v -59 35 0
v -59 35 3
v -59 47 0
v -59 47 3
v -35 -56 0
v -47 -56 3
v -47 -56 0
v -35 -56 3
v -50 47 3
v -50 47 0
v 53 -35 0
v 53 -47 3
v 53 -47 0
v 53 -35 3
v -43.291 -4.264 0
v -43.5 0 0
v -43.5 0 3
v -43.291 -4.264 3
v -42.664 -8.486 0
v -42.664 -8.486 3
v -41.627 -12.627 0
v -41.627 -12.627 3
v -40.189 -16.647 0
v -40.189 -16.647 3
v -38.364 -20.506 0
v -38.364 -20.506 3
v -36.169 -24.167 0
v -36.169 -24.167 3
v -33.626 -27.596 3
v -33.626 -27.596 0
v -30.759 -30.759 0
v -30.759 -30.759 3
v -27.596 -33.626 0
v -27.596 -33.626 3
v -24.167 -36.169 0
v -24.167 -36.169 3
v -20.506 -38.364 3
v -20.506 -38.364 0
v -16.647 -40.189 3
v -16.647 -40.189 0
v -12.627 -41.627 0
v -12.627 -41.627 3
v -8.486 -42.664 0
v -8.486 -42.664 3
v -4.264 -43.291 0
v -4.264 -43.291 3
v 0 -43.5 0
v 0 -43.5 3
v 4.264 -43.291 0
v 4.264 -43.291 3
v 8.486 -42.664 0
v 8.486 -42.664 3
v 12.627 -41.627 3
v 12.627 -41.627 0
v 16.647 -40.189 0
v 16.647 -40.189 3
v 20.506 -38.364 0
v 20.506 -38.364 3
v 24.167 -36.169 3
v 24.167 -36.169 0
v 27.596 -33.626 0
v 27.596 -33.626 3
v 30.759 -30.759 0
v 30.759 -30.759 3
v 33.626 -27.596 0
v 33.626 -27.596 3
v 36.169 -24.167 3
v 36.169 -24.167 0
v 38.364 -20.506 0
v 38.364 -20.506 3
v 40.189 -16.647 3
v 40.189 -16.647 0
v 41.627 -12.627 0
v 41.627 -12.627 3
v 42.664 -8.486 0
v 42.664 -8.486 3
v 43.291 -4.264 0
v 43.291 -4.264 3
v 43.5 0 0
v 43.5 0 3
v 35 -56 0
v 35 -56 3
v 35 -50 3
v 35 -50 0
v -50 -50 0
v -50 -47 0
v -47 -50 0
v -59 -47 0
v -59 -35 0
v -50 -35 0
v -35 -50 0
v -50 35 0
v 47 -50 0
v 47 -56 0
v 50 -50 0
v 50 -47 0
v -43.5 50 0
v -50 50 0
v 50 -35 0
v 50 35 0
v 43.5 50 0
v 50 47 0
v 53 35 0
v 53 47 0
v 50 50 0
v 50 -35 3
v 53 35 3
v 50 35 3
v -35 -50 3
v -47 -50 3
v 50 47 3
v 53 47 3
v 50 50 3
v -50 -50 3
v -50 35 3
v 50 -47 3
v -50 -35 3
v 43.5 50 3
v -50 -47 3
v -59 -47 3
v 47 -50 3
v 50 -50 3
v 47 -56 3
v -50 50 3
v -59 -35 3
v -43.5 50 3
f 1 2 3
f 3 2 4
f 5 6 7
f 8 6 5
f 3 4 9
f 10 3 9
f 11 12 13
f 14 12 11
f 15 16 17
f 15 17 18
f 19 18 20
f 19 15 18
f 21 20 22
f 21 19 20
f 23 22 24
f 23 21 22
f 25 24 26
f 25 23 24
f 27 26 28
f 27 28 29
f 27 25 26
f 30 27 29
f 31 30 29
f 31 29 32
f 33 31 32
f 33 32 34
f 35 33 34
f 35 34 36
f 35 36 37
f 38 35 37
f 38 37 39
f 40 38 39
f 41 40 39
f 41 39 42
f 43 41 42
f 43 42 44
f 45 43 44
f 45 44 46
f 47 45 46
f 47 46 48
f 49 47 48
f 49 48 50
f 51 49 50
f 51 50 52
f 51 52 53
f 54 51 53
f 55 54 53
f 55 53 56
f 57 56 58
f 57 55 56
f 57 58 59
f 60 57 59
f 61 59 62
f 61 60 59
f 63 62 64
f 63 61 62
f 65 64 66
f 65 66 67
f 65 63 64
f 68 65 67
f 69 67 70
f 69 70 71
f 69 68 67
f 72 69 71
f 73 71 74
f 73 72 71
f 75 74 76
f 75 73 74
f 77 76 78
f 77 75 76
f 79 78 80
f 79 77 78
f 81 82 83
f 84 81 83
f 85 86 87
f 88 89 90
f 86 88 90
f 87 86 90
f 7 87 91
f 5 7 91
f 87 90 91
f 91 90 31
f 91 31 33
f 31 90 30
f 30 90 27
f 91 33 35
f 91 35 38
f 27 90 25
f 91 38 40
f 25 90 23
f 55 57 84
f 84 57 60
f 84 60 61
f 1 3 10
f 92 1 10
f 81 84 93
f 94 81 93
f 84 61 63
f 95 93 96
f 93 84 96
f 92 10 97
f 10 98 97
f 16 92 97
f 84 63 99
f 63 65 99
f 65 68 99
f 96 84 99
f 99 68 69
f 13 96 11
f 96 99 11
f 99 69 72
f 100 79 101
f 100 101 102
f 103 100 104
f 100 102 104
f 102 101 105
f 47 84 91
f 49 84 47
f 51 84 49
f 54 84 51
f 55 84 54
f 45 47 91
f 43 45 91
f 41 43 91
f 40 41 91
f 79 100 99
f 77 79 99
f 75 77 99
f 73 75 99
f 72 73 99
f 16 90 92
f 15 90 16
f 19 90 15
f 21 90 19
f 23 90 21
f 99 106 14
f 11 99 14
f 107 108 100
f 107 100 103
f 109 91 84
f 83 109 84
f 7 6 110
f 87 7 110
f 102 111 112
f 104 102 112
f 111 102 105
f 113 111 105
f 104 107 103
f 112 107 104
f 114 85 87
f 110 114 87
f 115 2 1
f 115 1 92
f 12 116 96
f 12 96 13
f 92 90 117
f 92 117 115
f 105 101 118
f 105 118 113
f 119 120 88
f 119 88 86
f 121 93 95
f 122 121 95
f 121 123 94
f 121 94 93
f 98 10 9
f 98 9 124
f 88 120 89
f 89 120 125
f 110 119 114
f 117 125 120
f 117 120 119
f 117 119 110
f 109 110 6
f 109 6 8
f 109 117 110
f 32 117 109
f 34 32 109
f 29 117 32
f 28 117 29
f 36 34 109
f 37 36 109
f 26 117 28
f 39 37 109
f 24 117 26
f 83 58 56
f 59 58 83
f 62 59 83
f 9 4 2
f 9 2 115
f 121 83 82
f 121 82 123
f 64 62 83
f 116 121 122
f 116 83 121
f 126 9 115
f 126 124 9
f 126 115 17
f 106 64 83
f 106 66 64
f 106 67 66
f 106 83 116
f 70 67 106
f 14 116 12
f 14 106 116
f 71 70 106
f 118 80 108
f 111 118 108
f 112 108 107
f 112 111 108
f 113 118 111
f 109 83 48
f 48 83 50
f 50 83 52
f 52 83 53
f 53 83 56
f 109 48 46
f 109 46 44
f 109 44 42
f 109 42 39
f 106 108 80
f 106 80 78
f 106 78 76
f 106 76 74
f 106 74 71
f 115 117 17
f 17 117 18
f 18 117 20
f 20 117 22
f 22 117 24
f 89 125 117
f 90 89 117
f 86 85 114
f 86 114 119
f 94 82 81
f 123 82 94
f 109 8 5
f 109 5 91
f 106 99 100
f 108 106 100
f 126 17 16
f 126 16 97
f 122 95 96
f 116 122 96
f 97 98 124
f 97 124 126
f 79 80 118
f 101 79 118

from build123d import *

# Parameters (mm, degrees)
CROQUIS1_W              = 100
CROQUIS1_H              = 100
CROQUIS1_R              = 43.5
SALIENTE_EXTRUIR1_DEPTH = 3
CROQUIS2_W              = 12
CROQUIS2_H              = 6
CROQUIS2_W_2            = 9
CROQUIS2_H_2            = 12
CROQUIS2_W_3            = 3
SALIENTE_EXTRUIR2_DEPTH = 3
CROQUIS3_W              = 87
CROQUIS3_H              = 50
CORTAR_EXTRUIR1_DEPTH   = 10


with BuildPart() as part:
    # Croquis1 → Saliente-Extruir1 (new body)
    with BuildSketch(Plane.XY):
        Rectangle(CROQUIS1_W, CROQUIS1_H)
        Circle(CROQUIS1_R, mode=Mode.SUBTRACT)
    extrude(amount=SALIENTE_EXTRUIR1_DEPTH)

    # Croquis2 → Saliente-Extruir2 (add)
    with BuildSketch(Plane.XY.offset(3)):
        with Locations((-41, -53)):
            Rectangle(CROQUIS2_W, CROQUIS2_H)
        with Locations((41, -53)):
            Rectangle(CROQUIS2_W, CROQUIS2_H)
        with Locations((-54.5, -41)):
            Rectangle(CROQUIS2_W_2, CROQUIS2_H_2)
        with Locations((51.5, -41)):
            Rectangle(CROQUIS2_W_3, CROQUIS2_H_2)
        with Locations((51.5, 41)):
            Rectangle(CROQUIS2_W_3, CROQUIS2_H_2)
        with Locations((-54.5, 41)):
            Rectangle(CROQUIS2_W_2, CROQUIS2_H_2)
    extrude(amount=-SALIENTE_EXTRUIR2_DEPTH)

    # Croquis3 → Cortar-Extruir1 (cut)
    with BuildSketch(Plane.XY.offset(3)):
        with Locations((0, 25)):
            Rectangle(CROQUIS3_W, CROQUIS3_H)
    extrude(amount=-CORTAR_EXTRUIR1_DEPTH, mode=Mode.SUBTRACT)


solid = part.part
